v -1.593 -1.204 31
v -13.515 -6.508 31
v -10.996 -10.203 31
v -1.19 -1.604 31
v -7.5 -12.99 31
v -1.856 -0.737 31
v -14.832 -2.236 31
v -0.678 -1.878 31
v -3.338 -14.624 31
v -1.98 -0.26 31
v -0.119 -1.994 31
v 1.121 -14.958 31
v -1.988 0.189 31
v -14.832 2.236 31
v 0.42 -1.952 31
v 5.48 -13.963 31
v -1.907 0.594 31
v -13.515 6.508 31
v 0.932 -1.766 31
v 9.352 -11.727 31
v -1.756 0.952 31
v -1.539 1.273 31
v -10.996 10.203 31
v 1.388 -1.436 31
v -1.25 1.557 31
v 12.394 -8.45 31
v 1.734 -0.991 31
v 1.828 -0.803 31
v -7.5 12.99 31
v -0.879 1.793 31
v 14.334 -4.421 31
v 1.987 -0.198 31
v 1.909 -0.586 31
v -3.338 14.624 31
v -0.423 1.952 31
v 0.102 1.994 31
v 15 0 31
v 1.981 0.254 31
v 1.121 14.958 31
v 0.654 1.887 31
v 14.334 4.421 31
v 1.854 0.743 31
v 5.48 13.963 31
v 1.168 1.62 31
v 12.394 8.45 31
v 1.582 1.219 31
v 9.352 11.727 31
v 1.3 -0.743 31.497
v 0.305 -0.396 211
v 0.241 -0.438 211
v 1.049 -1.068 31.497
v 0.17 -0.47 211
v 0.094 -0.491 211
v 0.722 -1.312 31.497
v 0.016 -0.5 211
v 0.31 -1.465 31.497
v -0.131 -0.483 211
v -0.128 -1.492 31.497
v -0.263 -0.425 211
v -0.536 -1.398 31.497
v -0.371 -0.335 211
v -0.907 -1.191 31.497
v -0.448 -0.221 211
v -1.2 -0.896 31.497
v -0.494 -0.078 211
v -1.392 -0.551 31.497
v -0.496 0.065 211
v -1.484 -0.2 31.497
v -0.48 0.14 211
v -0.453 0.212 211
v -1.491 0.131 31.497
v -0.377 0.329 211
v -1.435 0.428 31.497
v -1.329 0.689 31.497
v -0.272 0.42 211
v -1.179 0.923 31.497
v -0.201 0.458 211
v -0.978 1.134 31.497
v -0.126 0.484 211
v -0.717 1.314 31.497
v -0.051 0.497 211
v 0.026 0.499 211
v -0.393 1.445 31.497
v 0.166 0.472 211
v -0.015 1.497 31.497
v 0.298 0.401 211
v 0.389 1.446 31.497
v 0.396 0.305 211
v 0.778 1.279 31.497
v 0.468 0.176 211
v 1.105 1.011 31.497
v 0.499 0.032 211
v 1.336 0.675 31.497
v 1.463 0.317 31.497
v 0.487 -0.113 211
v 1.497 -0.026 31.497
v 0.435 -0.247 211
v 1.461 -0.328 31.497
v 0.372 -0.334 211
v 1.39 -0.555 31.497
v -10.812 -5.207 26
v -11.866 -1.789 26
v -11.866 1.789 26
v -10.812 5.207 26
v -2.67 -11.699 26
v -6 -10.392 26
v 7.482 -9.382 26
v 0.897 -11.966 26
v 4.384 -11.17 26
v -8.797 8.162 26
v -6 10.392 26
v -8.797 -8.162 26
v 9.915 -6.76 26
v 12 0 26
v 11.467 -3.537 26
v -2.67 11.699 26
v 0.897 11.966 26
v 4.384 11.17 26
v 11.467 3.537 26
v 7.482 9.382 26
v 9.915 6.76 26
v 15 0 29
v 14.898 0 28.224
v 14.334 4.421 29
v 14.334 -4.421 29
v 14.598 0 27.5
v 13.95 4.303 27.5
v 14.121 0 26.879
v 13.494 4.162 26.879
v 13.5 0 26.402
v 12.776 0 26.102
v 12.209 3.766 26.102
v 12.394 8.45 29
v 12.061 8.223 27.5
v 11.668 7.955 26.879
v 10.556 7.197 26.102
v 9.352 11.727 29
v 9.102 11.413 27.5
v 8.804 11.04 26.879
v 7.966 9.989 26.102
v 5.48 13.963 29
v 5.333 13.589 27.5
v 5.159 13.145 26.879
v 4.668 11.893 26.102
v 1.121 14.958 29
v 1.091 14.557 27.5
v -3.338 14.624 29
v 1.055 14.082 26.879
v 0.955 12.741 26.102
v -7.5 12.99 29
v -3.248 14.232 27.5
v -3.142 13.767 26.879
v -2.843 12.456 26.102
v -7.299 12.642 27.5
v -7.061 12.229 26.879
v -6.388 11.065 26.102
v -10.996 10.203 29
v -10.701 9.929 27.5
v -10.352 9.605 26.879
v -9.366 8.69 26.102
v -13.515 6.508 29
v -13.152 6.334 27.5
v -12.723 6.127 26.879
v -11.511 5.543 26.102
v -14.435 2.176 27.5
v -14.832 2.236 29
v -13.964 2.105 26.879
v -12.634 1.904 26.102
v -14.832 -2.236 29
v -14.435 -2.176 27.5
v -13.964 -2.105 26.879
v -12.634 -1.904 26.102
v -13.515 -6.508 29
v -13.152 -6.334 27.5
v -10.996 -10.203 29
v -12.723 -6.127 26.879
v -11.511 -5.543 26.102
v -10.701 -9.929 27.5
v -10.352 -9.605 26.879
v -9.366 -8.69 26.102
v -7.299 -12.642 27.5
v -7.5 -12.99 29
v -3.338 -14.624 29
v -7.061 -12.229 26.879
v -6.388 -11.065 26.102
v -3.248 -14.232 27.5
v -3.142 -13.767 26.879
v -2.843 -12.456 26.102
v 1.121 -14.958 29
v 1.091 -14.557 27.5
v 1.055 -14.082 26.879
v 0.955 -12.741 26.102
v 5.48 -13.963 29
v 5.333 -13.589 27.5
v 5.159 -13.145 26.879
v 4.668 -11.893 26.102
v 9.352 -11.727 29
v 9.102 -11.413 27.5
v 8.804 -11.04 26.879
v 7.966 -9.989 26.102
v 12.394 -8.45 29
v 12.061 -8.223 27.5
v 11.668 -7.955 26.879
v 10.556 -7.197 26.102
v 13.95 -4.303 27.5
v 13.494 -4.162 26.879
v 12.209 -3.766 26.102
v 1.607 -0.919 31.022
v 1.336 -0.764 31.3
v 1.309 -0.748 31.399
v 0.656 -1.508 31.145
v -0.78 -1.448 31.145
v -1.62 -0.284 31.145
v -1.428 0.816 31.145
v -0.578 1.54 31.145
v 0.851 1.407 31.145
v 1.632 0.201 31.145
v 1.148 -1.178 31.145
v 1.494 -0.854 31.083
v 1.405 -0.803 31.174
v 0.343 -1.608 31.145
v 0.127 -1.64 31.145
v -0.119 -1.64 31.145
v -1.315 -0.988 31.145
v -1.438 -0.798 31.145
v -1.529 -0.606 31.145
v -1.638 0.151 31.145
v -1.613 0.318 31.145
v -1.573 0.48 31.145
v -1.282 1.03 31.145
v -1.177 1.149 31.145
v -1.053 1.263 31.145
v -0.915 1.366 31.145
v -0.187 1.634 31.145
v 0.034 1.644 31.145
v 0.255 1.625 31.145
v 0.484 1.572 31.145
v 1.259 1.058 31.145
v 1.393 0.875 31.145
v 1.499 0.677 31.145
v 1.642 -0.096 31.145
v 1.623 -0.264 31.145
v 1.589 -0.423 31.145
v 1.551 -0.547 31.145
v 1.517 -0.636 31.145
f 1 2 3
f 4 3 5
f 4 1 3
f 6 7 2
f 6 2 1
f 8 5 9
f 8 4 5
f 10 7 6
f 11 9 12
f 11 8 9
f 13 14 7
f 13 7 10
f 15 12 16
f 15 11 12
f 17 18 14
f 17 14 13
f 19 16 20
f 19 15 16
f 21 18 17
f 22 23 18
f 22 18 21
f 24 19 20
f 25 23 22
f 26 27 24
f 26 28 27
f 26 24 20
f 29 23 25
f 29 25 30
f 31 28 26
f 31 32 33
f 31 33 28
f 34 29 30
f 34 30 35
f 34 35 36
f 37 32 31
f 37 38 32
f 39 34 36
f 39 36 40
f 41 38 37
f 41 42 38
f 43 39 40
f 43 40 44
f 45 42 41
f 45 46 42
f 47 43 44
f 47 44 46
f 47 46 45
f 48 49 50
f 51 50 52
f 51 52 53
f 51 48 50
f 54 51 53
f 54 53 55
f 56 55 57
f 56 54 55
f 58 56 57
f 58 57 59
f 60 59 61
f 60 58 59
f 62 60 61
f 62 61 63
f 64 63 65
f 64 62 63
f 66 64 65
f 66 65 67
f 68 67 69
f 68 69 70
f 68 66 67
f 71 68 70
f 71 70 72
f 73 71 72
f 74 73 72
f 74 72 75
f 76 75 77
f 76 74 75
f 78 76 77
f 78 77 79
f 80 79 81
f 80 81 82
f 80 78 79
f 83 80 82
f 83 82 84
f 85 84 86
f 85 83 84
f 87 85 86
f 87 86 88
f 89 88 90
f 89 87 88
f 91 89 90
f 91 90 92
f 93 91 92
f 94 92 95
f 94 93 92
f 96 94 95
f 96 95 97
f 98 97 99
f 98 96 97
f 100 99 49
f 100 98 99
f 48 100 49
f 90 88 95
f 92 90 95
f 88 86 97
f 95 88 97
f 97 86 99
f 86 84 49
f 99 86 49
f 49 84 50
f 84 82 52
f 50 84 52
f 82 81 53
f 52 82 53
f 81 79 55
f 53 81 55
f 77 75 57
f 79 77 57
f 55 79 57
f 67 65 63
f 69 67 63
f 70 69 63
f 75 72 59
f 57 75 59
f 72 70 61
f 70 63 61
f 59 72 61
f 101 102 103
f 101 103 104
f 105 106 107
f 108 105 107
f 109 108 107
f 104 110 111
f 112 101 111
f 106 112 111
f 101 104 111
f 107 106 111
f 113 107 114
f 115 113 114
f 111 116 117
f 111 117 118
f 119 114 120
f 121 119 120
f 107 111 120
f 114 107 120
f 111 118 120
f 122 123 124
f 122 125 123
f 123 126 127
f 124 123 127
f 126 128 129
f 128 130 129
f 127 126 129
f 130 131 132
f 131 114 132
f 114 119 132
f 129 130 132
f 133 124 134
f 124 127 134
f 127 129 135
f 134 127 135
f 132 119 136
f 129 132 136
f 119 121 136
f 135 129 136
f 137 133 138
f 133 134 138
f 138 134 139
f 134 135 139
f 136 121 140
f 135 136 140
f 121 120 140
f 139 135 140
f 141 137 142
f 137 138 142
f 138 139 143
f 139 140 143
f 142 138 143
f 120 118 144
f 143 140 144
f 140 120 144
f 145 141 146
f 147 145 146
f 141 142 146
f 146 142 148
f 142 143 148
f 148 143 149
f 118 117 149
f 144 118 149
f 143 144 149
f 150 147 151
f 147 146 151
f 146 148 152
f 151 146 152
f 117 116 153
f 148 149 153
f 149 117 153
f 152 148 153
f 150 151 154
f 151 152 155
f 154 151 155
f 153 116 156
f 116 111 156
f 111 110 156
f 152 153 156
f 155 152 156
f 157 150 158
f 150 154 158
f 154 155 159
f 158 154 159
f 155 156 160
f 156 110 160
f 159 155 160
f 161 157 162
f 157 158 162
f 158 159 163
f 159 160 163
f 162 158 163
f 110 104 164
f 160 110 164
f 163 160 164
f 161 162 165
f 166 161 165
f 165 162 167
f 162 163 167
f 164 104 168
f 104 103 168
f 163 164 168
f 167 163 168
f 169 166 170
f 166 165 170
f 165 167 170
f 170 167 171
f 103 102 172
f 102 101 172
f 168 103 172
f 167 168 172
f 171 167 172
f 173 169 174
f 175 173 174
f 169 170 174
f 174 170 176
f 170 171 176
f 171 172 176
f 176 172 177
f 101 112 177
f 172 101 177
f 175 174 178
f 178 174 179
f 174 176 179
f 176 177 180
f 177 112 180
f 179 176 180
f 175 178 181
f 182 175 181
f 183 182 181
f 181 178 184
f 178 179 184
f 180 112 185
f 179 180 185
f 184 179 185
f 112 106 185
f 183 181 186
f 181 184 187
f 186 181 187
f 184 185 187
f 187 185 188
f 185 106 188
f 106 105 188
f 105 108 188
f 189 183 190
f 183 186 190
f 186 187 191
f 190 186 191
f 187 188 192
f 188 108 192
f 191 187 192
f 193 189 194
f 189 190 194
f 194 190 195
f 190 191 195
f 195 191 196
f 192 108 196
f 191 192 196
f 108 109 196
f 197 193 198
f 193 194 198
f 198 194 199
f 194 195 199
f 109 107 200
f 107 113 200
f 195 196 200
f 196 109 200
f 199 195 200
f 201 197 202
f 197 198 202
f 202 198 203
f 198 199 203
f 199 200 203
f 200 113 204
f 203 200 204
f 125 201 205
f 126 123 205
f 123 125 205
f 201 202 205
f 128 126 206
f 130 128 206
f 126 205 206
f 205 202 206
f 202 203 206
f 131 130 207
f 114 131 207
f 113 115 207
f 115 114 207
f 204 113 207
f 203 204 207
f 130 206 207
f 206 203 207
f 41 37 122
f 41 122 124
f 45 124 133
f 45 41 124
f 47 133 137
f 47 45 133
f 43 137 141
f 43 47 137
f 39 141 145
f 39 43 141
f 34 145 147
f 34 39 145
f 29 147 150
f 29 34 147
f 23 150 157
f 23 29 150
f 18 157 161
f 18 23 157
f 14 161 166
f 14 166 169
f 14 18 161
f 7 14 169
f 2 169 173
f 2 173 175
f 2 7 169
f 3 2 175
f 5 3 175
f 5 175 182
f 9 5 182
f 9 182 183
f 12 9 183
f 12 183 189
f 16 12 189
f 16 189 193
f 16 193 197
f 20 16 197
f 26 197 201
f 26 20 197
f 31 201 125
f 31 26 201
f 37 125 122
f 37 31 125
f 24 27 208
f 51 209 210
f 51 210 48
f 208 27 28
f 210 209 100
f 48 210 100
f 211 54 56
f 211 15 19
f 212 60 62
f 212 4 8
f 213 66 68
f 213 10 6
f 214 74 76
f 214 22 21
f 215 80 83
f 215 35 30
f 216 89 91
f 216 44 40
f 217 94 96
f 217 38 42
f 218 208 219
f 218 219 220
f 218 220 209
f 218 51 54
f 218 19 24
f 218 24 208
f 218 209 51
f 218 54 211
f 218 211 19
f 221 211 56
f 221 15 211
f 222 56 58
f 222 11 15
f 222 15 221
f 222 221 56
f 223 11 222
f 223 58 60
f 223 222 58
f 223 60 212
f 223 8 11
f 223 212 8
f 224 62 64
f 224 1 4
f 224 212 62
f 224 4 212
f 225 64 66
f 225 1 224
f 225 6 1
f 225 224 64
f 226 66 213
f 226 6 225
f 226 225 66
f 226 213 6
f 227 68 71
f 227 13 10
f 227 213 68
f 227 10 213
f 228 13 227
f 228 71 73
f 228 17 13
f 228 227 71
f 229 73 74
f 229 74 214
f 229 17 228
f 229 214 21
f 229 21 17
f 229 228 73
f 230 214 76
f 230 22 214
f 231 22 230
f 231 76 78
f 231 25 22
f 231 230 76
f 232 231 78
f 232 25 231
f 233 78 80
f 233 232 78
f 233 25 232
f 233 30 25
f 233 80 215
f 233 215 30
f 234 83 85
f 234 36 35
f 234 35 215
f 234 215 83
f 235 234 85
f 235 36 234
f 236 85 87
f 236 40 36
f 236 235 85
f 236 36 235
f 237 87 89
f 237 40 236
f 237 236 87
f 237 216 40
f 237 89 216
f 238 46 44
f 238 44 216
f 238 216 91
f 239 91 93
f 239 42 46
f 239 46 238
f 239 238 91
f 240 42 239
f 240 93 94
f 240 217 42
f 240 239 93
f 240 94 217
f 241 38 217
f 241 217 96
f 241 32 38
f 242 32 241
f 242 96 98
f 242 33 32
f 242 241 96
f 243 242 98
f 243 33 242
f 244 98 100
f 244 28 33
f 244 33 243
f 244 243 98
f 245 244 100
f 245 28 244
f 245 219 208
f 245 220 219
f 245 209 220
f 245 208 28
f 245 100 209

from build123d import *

# Parameters (mm, degrees)
SKETCH8_R           = 15
BOSS_EXTRUDE1_DEPTH = 5
FILLET1_R           = 3
FILLET2_R           = 0.5


with BuildPart() as part:
    # Loft1: read off the stored shape, not the designer's step
    # Loft1: loft between two sections, ruled curve by curve
    loft1_from = [
        Edge.make_bspline([(0.305459622, -0.395846459, 211), (-0.486233297, -1.006765703, 211), (-1.097152541, -0.215072785, 211), (-0.305459622, 0.395846459, 211), (0.486233297, 1.006765703, 211), (1.097152541, 0.215072785, 211), (0.305459622, -0.395846459, 211)], [0, 0, 0, 0, 0.5, 0.5, 0.5, 1, 1, 1, 1], 3, [1, 0.333333333, 0.333333333, 1, 0.333333333, 0.333333333, 1]),
    ]
    loft1_to = [
        Edge.make_bspline([(1.302480056, -0.744006522, 31), (-0.185532988, -3.348966633, 31), (-2.790493099, -1.86095359, 31), (-1.302480056, 0.744006522, 31), (0.185532988, 3.348966633, 31), (2.790493099, 1.86095359, 31), (1.302480056, -0.744006522, 31)], [0, 0, 0, 0, 0.5, 0.5, 0.5, 1, 1, 1, 1], 3, [1, 0.333333333, 0.333333333, 1, 0.333333333, 0.333333333, 1]),
    ]
    loft1 = Solid(Shell([*[Face.make_surface_from_curves(loft1_from[k], loft1_to[k]) for k in range(1)], Face(Wire(loft1_from)), Face(Wire(loft1_to))]))
    add(loft1)

    # Sketch8 → Boss-Extrude1 (add)
    with BuildSketch(Plane.XY.offset(31)):
        Circle(SKETCH8_R)
    extrude(amount=-BOSS_EXTRUDE1_DEPTH)

    # Fillet1
    fillet1_edges = [part.edges().sort_by_distance(p)[0] for p in [
        (-15, 0, 26),
    ]]
    fillet(fillet1_edges, radius=FILLET1_R)

    # Fillet2
    fillet2_edges = [part.edges().sort_by_distance(p)[0] for p in [
        (-1.302480056, 0.744006522, 31),
    ]]
    fillet(fillet2_edges, radius=FILLET2_R)


solid = part.part
